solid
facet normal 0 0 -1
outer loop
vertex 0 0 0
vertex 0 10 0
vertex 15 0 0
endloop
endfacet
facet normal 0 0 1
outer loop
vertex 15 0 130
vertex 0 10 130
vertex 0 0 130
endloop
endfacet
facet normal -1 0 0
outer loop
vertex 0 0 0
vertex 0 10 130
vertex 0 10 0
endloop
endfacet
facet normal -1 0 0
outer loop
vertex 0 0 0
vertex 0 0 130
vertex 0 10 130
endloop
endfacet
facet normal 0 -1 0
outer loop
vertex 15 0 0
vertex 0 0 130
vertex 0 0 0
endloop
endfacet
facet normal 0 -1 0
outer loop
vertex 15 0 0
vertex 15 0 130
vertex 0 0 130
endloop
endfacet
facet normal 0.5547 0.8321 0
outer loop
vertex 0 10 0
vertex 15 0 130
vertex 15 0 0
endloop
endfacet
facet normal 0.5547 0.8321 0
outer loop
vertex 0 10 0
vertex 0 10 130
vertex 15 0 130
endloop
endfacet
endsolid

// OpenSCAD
$fn = 360;

thickness = 2;
length = 120;
inner_height = 20;
outer_height = 20;
space = 3;

module test() {
    cube([length, thickness, inner_height]);
    cube([length, thickness * 3, thickness]);
    translate([0, thickness * 2, 0])
        cube([length, thickness, outer_height]);
}
    
module tri_cube(l, d, h) {
    linear_extrude(height = l)
        polygon([[0,0], [h,0], [0,d], [0,0]]);
}

tri_cube(130,10,15);
